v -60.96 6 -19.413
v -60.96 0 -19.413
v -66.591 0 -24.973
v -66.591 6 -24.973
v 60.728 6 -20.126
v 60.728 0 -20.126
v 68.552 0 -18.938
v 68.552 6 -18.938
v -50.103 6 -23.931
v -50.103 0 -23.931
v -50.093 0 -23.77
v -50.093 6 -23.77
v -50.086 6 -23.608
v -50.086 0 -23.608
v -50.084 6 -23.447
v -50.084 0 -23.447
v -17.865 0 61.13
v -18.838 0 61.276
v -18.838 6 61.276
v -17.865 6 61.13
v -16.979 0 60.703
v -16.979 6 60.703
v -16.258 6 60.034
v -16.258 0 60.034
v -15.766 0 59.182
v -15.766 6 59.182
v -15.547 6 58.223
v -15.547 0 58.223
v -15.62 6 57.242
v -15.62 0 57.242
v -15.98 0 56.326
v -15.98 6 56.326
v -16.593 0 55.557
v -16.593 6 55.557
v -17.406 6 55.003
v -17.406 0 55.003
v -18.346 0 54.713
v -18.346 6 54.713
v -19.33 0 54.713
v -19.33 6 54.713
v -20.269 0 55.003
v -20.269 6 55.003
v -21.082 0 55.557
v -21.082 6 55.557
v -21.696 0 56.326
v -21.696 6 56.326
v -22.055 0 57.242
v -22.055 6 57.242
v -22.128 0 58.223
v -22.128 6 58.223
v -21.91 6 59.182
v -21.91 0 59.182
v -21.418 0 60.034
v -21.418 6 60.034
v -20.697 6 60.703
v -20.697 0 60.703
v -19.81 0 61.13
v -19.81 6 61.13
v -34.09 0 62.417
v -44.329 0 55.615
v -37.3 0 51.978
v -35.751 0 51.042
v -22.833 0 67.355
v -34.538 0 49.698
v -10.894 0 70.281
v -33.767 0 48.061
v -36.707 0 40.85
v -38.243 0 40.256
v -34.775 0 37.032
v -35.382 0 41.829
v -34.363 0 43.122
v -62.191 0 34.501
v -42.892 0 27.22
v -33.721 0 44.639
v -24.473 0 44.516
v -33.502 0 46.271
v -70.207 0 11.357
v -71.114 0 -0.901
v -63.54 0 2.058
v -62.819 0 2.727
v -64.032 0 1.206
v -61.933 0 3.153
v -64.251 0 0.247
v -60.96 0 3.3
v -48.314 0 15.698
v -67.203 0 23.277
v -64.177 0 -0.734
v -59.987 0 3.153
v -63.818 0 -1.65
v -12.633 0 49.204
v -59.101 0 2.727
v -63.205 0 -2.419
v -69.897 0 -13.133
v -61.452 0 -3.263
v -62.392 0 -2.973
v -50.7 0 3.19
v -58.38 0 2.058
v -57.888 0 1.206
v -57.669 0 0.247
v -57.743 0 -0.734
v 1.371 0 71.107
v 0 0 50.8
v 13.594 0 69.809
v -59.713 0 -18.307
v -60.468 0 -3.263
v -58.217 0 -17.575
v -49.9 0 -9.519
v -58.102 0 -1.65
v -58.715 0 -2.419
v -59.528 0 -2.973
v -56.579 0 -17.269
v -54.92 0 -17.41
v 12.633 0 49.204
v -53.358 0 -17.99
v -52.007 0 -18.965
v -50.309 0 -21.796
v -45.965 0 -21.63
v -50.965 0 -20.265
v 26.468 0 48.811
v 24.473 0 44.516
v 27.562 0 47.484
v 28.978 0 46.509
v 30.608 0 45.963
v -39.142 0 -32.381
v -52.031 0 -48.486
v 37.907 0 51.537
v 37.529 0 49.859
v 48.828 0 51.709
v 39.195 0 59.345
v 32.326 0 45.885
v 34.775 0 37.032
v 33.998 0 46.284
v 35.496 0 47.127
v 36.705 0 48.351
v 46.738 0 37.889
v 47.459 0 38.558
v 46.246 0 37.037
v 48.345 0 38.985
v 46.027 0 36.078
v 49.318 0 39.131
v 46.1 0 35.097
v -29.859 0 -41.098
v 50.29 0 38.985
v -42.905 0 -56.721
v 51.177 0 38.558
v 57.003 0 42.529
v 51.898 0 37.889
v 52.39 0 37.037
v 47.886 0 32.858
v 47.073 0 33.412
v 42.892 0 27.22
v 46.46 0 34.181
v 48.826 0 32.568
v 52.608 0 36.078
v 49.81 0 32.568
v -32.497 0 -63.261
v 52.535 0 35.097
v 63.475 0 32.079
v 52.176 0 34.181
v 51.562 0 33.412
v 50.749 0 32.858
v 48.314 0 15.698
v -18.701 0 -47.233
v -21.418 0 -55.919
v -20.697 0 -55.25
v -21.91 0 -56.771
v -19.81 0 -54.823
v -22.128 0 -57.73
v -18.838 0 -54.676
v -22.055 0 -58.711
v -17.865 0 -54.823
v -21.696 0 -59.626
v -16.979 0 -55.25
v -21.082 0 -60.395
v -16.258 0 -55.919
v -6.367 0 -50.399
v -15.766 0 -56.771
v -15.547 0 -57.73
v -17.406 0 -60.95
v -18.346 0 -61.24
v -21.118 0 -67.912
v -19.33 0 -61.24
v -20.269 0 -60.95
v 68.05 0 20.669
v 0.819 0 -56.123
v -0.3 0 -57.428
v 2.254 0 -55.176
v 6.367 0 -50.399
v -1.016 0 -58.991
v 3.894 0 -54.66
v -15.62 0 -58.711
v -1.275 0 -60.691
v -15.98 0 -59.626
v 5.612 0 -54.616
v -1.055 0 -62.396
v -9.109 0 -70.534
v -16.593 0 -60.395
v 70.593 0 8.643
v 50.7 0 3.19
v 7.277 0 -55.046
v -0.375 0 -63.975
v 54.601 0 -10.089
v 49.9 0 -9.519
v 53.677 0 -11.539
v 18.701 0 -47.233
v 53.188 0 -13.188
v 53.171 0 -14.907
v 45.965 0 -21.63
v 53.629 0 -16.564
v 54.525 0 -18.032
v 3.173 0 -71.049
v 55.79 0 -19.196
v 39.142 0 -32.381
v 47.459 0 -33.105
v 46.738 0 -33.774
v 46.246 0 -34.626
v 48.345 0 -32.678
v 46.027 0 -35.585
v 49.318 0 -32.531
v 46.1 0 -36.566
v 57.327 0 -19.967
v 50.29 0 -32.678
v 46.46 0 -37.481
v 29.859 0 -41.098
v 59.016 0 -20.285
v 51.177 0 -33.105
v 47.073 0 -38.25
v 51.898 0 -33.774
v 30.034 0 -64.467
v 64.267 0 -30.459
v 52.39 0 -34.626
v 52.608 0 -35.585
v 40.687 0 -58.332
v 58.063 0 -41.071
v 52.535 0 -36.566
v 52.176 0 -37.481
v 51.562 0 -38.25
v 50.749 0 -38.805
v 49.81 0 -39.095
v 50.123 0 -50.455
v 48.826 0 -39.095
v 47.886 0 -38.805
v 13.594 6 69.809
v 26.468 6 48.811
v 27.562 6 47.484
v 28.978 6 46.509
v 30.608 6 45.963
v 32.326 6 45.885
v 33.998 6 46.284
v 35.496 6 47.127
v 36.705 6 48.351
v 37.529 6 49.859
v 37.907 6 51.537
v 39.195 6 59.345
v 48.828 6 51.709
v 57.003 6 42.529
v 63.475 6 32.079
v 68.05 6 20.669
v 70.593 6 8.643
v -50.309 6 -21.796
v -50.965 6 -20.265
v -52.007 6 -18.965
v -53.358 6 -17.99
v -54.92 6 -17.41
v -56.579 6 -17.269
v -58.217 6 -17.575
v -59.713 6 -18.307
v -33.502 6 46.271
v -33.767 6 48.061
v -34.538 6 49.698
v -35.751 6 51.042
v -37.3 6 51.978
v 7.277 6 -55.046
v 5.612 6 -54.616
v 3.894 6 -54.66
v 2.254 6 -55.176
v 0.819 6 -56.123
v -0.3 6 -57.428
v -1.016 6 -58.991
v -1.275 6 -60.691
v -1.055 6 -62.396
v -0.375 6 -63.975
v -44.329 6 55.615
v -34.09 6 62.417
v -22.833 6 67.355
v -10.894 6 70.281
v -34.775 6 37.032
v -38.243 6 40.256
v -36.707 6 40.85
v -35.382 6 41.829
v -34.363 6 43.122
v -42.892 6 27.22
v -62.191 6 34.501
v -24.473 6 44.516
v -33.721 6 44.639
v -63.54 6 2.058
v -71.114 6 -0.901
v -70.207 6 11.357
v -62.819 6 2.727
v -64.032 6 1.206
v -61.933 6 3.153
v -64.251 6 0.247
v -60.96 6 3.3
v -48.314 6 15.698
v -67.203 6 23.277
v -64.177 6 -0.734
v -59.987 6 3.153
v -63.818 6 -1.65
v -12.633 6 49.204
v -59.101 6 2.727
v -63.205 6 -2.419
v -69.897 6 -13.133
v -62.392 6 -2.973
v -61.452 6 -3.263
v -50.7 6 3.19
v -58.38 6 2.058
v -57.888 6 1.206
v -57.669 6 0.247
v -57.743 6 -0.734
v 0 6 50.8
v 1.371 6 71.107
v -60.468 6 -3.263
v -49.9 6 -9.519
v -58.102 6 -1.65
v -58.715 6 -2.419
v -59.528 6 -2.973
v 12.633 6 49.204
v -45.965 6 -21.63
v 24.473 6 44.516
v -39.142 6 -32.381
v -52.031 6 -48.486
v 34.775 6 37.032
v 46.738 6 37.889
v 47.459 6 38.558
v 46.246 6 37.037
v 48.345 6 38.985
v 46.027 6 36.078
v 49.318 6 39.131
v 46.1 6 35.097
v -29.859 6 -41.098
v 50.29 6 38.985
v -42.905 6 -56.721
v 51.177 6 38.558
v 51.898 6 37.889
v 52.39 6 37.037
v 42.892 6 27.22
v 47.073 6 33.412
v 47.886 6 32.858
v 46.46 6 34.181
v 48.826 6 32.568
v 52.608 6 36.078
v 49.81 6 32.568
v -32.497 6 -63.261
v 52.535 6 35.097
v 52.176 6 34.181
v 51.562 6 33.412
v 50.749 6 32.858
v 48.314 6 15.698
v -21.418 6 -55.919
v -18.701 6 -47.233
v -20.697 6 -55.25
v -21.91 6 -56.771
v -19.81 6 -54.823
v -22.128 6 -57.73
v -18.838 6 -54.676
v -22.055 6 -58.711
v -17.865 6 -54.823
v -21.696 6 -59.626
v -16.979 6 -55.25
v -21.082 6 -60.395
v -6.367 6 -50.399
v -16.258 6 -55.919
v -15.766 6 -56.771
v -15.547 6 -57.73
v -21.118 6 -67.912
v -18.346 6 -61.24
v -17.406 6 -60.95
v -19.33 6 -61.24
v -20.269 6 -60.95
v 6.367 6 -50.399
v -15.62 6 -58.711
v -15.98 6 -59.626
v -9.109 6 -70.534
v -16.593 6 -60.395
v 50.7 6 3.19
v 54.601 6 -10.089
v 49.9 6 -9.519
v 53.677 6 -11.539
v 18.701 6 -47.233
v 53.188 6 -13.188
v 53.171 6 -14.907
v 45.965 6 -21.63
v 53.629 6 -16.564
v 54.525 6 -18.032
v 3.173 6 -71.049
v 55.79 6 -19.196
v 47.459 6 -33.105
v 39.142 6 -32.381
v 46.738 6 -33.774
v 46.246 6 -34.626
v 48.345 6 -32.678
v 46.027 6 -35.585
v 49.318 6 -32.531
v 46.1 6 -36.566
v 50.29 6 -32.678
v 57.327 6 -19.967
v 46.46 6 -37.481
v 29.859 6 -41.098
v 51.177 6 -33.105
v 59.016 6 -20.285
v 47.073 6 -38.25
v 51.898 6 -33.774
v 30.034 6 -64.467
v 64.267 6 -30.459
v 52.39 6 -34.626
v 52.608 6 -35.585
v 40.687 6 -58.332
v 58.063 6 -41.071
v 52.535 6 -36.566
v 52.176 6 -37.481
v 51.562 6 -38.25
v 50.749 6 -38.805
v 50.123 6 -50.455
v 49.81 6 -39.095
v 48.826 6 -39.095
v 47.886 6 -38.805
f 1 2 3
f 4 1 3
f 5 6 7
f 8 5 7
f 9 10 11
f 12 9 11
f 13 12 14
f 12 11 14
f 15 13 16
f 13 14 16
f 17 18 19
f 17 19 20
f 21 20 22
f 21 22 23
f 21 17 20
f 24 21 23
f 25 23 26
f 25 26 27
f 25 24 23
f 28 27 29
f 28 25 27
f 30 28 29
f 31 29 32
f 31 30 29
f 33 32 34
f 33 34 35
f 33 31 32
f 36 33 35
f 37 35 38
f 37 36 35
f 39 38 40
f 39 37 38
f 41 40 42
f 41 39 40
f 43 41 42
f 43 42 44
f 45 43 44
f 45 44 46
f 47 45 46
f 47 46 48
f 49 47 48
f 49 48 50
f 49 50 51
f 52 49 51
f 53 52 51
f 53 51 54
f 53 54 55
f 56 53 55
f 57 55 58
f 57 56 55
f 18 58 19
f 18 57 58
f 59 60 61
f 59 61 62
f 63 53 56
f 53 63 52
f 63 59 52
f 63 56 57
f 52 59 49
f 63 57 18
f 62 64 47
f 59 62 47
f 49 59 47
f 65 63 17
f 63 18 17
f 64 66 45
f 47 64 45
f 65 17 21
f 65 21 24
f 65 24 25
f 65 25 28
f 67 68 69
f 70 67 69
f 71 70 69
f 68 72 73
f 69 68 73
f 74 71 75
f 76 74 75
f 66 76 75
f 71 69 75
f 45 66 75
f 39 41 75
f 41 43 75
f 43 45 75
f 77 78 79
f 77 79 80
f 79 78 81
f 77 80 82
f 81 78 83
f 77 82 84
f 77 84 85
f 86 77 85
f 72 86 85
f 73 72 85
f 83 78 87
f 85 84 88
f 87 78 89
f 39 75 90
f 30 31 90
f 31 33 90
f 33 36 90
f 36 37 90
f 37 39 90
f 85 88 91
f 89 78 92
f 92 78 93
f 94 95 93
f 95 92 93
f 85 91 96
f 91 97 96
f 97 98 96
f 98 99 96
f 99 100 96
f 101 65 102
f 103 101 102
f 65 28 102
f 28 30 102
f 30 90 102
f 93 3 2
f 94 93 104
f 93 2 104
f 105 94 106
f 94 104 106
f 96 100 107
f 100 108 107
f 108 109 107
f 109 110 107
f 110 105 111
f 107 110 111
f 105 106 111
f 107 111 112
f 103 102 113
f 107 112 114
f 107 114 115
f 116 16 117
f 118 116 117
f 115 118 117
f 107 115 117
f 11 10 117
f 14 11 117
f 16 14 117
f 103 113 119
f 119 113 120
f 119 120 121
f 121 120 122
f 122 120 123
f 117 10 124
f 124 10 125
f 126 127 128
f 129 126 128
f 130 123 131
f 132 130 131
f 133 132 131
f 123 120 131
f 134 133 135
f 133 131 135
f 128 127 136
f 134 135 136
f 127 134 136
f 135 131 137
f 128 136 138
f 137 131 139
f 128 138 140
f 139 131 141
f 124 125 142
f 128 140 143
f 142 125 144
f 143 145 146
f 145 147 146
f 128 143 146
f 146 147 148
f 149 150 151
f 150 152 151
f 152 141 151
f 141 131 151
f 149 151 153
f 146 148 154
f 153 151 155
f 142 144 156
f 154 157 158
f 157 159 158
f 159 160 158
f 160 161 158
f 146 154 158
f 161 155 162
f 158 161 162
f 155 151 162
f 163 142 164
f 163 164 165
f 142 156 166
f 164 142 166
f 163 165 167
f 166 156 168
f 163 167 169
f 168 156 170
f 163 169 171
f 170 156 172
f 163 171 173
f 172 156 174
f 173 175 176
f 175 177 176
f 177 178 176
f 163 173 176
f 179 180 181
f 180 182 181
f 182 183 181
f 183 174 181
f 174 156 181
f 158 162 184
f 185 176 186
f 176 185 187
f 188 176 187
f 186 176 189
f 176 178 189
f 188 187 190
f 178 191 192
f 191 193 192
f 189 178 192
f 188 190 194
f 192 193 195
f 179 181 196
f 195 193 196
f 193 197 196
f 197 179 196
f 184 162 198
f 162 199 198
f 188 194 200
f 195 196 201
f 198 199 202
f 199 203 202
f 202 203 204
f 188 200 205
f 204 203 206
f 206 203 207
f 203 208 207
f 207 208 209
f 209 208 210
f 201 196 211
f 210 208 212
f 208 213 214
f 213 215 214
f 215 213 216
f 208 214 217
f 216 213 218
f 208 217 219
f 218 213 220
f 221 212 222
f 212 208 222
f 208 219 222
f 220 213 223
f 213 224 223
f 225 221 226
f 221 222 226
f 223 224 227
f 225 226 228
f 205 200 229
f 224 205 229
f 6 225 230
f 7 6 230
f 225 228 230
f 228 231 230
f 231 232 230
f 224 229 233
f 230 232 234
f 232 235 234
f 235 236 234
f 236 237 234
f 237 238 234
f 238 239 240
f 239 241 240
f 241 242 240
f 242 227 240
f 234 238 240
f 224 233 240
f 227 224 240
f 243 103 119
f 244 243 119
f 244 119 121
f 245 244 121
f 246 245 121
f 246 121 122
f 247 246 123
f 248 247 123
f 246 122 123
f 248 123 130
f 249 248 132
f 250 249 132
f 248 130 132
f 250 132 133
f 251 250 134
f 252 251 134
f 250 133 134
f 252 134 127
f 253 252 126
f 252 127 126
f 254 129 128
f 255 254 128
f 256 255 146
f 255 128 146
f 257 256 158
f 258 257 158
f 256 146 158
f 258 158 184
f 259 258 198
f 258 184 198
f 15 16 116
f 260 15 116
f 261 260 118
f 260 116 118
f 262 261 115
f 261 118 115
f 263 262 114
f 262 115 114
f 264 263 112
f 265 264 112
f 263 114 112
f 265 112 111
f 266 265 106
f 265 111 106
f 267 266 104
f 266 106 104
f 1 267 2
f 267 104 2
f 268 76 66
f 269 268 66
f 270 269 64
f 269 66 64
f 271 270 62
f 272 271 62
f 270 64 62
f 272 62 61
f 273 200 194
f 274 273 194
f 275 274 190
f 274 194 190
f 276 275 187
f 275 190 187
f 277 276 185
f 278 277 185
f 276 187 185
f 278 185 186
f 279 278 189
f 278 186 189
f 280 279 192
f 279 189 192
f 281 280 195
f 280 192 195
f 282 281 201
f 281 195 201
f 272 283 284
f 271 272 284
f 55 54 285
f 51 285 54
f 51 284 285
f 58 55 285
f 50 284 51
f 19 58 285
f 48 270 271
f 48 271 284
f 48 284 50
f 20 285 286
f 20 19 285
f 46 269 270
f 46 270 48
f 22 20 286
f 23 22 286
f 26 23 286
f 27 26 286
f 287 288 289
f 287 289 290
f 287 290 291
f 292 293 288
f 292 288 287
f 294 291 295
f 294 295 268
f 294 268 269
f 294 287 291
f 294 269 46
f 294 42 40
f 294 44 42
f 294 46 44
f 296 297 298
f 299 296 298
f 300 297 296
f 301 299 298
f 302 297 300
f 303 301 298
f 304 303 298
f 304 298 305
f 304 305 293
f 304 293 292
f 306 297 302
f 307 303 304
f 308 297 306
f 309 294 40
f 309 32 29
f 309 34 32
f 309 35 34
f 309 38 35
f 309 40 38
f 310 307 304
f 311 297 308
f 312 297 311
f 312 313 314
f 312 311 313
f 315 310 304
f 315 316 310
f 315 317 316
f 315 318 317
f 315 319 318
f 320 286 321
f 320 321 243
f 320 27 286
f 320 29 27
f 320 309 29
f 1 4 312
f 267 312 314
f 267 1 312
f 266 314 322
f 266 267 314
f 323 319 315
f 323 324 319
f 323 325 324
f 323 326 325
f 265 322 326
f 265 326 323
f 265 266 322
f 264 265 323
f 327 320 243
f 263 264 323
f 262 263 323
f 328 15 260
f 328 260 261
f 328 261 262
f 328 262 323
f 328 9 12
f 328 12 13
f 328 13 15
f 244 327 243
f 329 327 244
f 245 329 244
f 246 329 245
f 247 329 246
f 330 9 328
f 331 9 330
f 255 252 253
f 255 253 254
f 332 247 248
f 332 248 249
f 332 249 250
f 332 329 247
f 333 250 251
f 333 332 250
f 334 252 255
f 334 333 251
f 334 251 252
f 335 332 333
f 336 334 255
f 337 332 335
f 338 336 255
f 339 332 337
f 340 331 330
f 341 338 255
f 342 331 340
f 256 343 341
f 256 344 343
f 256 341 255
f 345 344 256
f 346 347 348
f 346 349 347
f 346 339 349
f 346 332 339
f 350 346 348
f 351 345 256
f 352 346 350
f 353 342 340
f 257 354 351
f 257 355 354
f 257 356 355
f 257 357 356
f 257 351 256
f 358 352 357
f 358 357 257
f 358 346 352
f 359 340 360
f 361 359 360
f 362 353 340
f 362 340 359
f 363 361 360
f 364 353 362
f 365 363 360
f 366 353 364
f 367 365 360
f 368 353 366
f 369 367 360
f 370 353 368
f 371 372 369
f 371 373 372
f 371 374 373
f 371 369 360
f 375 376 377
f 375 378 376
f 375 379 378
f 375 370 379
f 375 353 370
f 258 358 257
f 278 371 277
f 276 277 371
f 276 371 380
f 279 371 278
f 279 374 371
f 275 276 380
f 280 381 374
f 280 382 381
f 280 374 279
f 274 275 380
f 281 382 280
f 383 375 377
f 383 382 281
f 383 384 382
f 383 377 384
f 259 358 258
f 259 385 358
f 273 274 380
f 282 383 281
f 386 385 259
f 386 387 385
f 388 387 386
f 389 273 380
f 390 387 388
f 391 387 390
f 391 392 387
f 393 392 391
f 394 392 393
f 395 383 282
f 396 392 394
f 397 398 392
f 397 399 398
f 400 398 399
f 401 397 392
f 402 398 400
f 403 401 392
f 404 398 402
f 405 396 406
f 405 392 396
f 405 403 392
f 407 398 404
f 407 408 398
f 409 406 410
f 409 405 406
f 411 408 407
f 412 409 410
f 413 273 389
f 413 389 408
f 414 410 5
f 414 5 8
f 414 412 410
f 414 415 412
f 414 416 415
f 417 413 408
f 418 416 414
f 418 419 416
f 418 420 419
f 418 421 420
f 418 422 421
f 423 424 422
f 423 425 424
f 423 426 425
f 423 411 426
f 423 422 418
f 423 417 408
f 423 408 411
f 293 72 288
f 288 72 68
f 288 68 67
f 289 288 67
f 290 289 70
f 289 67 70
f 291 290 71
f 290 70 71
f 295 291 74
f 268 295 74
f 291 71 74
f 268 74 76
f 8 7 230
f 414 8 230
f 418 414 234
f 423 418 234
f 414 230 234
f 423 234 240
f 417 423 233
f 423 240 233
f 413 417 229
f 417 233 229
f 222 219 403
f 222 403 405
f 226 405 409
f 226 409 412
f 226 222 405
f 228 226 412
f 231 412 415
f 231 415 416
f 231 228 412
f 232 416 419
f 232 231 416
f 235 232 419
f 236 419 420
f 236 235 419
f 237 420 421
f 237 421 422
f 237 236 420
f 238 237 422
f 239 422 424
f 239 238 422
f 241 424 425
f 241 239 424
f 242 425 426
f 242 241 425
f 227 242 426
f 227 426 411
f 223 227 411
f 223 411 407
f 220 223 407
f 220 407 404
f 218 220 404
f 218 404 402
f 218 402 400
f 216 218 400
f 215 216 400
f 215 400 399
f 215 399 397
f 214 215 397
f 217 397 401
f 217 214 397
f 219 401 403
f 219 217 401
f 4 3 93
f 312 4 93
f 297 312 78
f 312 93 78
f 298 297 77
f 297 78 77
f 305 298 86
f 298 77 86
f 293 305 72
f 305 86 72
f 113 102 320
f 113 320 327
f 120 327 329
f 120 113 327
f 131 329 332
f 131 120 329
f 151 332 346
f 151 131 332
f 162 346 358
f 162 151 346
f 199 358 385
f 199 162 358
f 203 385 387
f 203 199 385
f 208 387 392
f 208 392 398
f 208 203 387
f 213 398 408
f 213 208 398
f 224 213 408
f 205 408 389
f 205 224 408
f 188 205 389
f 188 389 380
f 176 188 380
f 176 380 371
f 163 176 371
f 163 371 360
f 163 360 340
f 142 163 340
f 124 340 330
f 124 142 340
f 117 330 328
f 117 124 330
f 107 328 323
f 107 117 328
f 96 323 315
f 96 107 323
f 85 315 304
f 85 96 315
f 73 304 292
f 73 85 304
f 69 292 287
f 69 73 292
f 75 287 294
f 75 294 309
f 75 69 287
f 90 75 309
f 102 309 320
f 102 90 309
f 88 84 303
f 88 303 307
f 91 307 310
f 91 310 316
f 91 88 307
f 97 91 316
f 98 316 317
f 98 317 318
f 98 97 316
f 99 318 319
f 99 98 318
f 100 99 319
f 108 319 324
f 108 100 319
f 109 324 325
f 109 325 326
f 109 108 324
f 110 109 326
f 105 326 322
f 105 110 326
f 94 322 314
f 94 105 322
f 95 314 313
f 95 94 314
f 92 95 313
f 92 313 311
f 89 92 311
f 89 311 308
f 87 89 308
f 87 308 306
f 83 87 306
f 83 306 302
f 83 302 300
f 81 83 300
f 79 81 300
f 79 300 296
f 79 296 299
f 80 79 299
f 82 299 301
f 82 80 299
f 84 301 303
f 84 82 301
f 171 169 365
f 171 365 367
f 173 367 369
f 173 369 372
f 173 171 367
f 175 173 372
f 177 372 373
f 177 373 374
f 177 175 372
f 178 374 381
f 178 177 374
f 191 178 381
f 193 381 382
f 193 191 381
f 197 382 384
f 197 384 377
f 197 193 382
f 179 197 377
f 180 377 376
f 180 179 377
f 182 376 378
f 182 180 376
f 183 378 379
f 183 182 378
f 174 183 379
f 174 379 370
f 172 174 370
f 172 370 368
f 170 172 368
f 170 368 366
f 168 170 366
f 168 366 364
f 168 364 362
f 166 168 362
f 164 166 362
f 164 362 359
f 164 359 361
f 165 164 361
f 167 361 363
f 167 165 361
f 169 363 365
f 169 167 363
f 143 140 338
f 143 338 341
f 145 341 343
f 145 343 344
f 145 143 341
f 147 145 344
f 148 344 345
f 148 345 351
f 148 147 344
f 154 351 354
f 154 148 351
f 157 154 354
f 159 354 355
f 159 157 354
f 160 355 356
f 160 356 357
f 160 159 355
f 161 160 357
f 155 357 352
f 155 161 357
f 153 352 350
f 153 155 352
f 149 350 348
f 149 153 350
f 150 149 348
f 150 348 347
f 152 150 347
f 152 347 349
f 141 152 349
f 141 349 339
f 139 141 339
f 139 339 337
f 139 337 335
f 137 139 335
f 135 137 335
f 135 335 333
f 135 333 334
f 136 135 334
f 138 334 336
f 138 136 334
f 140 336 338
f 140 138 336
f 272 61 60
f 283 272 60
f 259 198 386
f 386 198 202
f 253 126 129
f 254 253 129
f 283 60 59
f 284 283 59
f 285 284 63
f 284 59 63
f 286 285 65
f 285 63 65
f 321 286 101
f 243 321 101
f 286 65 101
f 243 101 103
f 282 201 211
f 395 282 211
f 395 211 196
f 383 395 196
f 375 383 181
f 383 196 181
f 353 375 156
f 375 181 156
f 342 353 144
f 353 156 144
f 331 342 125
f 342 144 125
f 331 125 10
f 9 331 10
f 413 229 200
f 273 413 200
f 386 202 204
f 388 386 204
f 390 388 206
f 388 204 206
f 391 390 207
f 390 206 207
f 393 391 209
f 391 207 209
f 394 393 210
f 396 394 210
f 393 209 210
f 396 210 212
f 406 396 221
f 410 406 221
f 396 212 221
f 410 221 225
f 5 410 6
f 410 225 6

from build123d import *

# Parameters (mm, degrees)
SKETCH1_R           = 3.3
SKETCH1_R_2         = 50.8
BOSS_EXTRUDE1_DEPTH = 6


with BuildPart() as part:
    # Sketch1 → Boss-Extrude1 (new body)
    with BuildSketch(Plane(origin=(0, 0, 0), x_dir=(1, 0, 0), z_dir=(0, 1, 0))):
        with BuildLine():
            ThreePointArc((-50.084292244, 23.446975703), (-54.118923856, 17.647036419), (-60.96, 19.41260294))
            Line((-60.96, 19.41260294), (-66.591321273, 24.972992034))
            ThreePointArc((-66.591321273, 24.972992034), (-70.926140308, -5.247572863), (-62.191041695, -34.501141038))
            Line((-62.191041695, -34.501141038), (-38.242542673, -40.255931215))
            ThreePointArc((-38.242542673, -40.255931215), (-34.829443057, -42.441548483), (-33.501782647, -46.270842108))
            ThreePointArc((-33.501782647, -46.270842108), (-34.53819598, -49.698469864), (-37.300158502, -51.97758102))
            Line((-37.300158502, -51.97758102), (-44.328576757, -55.615031086))
            ThreePointArc((-44.328576757, -55.615031086), (-16.926644335, -69.07635711), (13.594446222, -69.808634365))
            Line((13.594446222, -69.808634365), (26.468070107, -48.810586278))
            ThreePointArc((26.468070107, -48.810586278), (33.175934652, -46.026293541), (37.90723426, -51.536514664))
            Line((37.90723426, -51.536514664), (39.194754164, -59.344971531))
            ThreePointArc((39.194754164, -59.344971531), (60.464898794, -37.44396365), (70.592871518, -8.642967708))
            Line((70.592871518, -8.642967708), (54.600709616, 10.089329884))
            ThreePointArc((54.600709616, 10.089329884), (54.025534005, 17.329281943), (60.728117694, 20.126263296))
            Line((60.728117694, 20.126263296), (68.552267011, 18.937821619))
            ThreePointArc((68.552267011, 18.937821619), (54.296006916, 45.9347149), (30.03434774, 64.466986558))
            Line((30.03434774, 64.466986558), (7.277024245, 55.04613507))
            ThreePointArc((7.277024245, 55.04613507), (0.213681623, 56.736378783), (-0.375193452, 63.975229447))
            Line((-0.375193452, 63.975229447), (3.172876855, 71.049188964))
            ThreePointArc((3.172876855, 71.049188964), (-26.908121067, 65.833178722), (-52.030623785, 48.485756553))
            Line((-52.030623785, 48.485756553), (-50.103261295, 23.931052539))
            ThreePointArc((-50.103261295, 23.931052539), (-50.089036326, 23.68919988), (-50.084292244, 23.446975703))
        make_face()
        with Locations(Location((-18.837675977, -57.976405233, 0), (0, 0, 270))):
            Circle(SKETCH1_R, mode=Mode.SUBTRACT)
        with Locations(Location((-60.96, 0, 0), (0, 0, 270))):
            Circle(SKETCH1_R, mode=Mode.SUBTRACT)
        with Locations(Location((49.317675977, -35.83138898, 0), (0, 0, 270))):
            Circle(SKETCH1_R, mode=Mode.SUBTRACT)
        with Locations(Location((-18.837675977, 57.976405233, 0), (0, 0, 270))):
            Circle(SKETCH1_R, mode=Mode.SUBTRACT)
        with Locations(Location((0, 0, 0), (0, 0, 270))):
            Circle(SKETCH1_R_2, mode=Mode.SUBTRACT)
        with Locations(Location((49.317675977, 35.83138898, 0), (0, 0, 270))):
            Circle(SKETCH1_R, mode=Mode.SUBTRACT)
    extrude(amount=BOSS_EXTRUDE1_DEPTH)


solid = part.part
